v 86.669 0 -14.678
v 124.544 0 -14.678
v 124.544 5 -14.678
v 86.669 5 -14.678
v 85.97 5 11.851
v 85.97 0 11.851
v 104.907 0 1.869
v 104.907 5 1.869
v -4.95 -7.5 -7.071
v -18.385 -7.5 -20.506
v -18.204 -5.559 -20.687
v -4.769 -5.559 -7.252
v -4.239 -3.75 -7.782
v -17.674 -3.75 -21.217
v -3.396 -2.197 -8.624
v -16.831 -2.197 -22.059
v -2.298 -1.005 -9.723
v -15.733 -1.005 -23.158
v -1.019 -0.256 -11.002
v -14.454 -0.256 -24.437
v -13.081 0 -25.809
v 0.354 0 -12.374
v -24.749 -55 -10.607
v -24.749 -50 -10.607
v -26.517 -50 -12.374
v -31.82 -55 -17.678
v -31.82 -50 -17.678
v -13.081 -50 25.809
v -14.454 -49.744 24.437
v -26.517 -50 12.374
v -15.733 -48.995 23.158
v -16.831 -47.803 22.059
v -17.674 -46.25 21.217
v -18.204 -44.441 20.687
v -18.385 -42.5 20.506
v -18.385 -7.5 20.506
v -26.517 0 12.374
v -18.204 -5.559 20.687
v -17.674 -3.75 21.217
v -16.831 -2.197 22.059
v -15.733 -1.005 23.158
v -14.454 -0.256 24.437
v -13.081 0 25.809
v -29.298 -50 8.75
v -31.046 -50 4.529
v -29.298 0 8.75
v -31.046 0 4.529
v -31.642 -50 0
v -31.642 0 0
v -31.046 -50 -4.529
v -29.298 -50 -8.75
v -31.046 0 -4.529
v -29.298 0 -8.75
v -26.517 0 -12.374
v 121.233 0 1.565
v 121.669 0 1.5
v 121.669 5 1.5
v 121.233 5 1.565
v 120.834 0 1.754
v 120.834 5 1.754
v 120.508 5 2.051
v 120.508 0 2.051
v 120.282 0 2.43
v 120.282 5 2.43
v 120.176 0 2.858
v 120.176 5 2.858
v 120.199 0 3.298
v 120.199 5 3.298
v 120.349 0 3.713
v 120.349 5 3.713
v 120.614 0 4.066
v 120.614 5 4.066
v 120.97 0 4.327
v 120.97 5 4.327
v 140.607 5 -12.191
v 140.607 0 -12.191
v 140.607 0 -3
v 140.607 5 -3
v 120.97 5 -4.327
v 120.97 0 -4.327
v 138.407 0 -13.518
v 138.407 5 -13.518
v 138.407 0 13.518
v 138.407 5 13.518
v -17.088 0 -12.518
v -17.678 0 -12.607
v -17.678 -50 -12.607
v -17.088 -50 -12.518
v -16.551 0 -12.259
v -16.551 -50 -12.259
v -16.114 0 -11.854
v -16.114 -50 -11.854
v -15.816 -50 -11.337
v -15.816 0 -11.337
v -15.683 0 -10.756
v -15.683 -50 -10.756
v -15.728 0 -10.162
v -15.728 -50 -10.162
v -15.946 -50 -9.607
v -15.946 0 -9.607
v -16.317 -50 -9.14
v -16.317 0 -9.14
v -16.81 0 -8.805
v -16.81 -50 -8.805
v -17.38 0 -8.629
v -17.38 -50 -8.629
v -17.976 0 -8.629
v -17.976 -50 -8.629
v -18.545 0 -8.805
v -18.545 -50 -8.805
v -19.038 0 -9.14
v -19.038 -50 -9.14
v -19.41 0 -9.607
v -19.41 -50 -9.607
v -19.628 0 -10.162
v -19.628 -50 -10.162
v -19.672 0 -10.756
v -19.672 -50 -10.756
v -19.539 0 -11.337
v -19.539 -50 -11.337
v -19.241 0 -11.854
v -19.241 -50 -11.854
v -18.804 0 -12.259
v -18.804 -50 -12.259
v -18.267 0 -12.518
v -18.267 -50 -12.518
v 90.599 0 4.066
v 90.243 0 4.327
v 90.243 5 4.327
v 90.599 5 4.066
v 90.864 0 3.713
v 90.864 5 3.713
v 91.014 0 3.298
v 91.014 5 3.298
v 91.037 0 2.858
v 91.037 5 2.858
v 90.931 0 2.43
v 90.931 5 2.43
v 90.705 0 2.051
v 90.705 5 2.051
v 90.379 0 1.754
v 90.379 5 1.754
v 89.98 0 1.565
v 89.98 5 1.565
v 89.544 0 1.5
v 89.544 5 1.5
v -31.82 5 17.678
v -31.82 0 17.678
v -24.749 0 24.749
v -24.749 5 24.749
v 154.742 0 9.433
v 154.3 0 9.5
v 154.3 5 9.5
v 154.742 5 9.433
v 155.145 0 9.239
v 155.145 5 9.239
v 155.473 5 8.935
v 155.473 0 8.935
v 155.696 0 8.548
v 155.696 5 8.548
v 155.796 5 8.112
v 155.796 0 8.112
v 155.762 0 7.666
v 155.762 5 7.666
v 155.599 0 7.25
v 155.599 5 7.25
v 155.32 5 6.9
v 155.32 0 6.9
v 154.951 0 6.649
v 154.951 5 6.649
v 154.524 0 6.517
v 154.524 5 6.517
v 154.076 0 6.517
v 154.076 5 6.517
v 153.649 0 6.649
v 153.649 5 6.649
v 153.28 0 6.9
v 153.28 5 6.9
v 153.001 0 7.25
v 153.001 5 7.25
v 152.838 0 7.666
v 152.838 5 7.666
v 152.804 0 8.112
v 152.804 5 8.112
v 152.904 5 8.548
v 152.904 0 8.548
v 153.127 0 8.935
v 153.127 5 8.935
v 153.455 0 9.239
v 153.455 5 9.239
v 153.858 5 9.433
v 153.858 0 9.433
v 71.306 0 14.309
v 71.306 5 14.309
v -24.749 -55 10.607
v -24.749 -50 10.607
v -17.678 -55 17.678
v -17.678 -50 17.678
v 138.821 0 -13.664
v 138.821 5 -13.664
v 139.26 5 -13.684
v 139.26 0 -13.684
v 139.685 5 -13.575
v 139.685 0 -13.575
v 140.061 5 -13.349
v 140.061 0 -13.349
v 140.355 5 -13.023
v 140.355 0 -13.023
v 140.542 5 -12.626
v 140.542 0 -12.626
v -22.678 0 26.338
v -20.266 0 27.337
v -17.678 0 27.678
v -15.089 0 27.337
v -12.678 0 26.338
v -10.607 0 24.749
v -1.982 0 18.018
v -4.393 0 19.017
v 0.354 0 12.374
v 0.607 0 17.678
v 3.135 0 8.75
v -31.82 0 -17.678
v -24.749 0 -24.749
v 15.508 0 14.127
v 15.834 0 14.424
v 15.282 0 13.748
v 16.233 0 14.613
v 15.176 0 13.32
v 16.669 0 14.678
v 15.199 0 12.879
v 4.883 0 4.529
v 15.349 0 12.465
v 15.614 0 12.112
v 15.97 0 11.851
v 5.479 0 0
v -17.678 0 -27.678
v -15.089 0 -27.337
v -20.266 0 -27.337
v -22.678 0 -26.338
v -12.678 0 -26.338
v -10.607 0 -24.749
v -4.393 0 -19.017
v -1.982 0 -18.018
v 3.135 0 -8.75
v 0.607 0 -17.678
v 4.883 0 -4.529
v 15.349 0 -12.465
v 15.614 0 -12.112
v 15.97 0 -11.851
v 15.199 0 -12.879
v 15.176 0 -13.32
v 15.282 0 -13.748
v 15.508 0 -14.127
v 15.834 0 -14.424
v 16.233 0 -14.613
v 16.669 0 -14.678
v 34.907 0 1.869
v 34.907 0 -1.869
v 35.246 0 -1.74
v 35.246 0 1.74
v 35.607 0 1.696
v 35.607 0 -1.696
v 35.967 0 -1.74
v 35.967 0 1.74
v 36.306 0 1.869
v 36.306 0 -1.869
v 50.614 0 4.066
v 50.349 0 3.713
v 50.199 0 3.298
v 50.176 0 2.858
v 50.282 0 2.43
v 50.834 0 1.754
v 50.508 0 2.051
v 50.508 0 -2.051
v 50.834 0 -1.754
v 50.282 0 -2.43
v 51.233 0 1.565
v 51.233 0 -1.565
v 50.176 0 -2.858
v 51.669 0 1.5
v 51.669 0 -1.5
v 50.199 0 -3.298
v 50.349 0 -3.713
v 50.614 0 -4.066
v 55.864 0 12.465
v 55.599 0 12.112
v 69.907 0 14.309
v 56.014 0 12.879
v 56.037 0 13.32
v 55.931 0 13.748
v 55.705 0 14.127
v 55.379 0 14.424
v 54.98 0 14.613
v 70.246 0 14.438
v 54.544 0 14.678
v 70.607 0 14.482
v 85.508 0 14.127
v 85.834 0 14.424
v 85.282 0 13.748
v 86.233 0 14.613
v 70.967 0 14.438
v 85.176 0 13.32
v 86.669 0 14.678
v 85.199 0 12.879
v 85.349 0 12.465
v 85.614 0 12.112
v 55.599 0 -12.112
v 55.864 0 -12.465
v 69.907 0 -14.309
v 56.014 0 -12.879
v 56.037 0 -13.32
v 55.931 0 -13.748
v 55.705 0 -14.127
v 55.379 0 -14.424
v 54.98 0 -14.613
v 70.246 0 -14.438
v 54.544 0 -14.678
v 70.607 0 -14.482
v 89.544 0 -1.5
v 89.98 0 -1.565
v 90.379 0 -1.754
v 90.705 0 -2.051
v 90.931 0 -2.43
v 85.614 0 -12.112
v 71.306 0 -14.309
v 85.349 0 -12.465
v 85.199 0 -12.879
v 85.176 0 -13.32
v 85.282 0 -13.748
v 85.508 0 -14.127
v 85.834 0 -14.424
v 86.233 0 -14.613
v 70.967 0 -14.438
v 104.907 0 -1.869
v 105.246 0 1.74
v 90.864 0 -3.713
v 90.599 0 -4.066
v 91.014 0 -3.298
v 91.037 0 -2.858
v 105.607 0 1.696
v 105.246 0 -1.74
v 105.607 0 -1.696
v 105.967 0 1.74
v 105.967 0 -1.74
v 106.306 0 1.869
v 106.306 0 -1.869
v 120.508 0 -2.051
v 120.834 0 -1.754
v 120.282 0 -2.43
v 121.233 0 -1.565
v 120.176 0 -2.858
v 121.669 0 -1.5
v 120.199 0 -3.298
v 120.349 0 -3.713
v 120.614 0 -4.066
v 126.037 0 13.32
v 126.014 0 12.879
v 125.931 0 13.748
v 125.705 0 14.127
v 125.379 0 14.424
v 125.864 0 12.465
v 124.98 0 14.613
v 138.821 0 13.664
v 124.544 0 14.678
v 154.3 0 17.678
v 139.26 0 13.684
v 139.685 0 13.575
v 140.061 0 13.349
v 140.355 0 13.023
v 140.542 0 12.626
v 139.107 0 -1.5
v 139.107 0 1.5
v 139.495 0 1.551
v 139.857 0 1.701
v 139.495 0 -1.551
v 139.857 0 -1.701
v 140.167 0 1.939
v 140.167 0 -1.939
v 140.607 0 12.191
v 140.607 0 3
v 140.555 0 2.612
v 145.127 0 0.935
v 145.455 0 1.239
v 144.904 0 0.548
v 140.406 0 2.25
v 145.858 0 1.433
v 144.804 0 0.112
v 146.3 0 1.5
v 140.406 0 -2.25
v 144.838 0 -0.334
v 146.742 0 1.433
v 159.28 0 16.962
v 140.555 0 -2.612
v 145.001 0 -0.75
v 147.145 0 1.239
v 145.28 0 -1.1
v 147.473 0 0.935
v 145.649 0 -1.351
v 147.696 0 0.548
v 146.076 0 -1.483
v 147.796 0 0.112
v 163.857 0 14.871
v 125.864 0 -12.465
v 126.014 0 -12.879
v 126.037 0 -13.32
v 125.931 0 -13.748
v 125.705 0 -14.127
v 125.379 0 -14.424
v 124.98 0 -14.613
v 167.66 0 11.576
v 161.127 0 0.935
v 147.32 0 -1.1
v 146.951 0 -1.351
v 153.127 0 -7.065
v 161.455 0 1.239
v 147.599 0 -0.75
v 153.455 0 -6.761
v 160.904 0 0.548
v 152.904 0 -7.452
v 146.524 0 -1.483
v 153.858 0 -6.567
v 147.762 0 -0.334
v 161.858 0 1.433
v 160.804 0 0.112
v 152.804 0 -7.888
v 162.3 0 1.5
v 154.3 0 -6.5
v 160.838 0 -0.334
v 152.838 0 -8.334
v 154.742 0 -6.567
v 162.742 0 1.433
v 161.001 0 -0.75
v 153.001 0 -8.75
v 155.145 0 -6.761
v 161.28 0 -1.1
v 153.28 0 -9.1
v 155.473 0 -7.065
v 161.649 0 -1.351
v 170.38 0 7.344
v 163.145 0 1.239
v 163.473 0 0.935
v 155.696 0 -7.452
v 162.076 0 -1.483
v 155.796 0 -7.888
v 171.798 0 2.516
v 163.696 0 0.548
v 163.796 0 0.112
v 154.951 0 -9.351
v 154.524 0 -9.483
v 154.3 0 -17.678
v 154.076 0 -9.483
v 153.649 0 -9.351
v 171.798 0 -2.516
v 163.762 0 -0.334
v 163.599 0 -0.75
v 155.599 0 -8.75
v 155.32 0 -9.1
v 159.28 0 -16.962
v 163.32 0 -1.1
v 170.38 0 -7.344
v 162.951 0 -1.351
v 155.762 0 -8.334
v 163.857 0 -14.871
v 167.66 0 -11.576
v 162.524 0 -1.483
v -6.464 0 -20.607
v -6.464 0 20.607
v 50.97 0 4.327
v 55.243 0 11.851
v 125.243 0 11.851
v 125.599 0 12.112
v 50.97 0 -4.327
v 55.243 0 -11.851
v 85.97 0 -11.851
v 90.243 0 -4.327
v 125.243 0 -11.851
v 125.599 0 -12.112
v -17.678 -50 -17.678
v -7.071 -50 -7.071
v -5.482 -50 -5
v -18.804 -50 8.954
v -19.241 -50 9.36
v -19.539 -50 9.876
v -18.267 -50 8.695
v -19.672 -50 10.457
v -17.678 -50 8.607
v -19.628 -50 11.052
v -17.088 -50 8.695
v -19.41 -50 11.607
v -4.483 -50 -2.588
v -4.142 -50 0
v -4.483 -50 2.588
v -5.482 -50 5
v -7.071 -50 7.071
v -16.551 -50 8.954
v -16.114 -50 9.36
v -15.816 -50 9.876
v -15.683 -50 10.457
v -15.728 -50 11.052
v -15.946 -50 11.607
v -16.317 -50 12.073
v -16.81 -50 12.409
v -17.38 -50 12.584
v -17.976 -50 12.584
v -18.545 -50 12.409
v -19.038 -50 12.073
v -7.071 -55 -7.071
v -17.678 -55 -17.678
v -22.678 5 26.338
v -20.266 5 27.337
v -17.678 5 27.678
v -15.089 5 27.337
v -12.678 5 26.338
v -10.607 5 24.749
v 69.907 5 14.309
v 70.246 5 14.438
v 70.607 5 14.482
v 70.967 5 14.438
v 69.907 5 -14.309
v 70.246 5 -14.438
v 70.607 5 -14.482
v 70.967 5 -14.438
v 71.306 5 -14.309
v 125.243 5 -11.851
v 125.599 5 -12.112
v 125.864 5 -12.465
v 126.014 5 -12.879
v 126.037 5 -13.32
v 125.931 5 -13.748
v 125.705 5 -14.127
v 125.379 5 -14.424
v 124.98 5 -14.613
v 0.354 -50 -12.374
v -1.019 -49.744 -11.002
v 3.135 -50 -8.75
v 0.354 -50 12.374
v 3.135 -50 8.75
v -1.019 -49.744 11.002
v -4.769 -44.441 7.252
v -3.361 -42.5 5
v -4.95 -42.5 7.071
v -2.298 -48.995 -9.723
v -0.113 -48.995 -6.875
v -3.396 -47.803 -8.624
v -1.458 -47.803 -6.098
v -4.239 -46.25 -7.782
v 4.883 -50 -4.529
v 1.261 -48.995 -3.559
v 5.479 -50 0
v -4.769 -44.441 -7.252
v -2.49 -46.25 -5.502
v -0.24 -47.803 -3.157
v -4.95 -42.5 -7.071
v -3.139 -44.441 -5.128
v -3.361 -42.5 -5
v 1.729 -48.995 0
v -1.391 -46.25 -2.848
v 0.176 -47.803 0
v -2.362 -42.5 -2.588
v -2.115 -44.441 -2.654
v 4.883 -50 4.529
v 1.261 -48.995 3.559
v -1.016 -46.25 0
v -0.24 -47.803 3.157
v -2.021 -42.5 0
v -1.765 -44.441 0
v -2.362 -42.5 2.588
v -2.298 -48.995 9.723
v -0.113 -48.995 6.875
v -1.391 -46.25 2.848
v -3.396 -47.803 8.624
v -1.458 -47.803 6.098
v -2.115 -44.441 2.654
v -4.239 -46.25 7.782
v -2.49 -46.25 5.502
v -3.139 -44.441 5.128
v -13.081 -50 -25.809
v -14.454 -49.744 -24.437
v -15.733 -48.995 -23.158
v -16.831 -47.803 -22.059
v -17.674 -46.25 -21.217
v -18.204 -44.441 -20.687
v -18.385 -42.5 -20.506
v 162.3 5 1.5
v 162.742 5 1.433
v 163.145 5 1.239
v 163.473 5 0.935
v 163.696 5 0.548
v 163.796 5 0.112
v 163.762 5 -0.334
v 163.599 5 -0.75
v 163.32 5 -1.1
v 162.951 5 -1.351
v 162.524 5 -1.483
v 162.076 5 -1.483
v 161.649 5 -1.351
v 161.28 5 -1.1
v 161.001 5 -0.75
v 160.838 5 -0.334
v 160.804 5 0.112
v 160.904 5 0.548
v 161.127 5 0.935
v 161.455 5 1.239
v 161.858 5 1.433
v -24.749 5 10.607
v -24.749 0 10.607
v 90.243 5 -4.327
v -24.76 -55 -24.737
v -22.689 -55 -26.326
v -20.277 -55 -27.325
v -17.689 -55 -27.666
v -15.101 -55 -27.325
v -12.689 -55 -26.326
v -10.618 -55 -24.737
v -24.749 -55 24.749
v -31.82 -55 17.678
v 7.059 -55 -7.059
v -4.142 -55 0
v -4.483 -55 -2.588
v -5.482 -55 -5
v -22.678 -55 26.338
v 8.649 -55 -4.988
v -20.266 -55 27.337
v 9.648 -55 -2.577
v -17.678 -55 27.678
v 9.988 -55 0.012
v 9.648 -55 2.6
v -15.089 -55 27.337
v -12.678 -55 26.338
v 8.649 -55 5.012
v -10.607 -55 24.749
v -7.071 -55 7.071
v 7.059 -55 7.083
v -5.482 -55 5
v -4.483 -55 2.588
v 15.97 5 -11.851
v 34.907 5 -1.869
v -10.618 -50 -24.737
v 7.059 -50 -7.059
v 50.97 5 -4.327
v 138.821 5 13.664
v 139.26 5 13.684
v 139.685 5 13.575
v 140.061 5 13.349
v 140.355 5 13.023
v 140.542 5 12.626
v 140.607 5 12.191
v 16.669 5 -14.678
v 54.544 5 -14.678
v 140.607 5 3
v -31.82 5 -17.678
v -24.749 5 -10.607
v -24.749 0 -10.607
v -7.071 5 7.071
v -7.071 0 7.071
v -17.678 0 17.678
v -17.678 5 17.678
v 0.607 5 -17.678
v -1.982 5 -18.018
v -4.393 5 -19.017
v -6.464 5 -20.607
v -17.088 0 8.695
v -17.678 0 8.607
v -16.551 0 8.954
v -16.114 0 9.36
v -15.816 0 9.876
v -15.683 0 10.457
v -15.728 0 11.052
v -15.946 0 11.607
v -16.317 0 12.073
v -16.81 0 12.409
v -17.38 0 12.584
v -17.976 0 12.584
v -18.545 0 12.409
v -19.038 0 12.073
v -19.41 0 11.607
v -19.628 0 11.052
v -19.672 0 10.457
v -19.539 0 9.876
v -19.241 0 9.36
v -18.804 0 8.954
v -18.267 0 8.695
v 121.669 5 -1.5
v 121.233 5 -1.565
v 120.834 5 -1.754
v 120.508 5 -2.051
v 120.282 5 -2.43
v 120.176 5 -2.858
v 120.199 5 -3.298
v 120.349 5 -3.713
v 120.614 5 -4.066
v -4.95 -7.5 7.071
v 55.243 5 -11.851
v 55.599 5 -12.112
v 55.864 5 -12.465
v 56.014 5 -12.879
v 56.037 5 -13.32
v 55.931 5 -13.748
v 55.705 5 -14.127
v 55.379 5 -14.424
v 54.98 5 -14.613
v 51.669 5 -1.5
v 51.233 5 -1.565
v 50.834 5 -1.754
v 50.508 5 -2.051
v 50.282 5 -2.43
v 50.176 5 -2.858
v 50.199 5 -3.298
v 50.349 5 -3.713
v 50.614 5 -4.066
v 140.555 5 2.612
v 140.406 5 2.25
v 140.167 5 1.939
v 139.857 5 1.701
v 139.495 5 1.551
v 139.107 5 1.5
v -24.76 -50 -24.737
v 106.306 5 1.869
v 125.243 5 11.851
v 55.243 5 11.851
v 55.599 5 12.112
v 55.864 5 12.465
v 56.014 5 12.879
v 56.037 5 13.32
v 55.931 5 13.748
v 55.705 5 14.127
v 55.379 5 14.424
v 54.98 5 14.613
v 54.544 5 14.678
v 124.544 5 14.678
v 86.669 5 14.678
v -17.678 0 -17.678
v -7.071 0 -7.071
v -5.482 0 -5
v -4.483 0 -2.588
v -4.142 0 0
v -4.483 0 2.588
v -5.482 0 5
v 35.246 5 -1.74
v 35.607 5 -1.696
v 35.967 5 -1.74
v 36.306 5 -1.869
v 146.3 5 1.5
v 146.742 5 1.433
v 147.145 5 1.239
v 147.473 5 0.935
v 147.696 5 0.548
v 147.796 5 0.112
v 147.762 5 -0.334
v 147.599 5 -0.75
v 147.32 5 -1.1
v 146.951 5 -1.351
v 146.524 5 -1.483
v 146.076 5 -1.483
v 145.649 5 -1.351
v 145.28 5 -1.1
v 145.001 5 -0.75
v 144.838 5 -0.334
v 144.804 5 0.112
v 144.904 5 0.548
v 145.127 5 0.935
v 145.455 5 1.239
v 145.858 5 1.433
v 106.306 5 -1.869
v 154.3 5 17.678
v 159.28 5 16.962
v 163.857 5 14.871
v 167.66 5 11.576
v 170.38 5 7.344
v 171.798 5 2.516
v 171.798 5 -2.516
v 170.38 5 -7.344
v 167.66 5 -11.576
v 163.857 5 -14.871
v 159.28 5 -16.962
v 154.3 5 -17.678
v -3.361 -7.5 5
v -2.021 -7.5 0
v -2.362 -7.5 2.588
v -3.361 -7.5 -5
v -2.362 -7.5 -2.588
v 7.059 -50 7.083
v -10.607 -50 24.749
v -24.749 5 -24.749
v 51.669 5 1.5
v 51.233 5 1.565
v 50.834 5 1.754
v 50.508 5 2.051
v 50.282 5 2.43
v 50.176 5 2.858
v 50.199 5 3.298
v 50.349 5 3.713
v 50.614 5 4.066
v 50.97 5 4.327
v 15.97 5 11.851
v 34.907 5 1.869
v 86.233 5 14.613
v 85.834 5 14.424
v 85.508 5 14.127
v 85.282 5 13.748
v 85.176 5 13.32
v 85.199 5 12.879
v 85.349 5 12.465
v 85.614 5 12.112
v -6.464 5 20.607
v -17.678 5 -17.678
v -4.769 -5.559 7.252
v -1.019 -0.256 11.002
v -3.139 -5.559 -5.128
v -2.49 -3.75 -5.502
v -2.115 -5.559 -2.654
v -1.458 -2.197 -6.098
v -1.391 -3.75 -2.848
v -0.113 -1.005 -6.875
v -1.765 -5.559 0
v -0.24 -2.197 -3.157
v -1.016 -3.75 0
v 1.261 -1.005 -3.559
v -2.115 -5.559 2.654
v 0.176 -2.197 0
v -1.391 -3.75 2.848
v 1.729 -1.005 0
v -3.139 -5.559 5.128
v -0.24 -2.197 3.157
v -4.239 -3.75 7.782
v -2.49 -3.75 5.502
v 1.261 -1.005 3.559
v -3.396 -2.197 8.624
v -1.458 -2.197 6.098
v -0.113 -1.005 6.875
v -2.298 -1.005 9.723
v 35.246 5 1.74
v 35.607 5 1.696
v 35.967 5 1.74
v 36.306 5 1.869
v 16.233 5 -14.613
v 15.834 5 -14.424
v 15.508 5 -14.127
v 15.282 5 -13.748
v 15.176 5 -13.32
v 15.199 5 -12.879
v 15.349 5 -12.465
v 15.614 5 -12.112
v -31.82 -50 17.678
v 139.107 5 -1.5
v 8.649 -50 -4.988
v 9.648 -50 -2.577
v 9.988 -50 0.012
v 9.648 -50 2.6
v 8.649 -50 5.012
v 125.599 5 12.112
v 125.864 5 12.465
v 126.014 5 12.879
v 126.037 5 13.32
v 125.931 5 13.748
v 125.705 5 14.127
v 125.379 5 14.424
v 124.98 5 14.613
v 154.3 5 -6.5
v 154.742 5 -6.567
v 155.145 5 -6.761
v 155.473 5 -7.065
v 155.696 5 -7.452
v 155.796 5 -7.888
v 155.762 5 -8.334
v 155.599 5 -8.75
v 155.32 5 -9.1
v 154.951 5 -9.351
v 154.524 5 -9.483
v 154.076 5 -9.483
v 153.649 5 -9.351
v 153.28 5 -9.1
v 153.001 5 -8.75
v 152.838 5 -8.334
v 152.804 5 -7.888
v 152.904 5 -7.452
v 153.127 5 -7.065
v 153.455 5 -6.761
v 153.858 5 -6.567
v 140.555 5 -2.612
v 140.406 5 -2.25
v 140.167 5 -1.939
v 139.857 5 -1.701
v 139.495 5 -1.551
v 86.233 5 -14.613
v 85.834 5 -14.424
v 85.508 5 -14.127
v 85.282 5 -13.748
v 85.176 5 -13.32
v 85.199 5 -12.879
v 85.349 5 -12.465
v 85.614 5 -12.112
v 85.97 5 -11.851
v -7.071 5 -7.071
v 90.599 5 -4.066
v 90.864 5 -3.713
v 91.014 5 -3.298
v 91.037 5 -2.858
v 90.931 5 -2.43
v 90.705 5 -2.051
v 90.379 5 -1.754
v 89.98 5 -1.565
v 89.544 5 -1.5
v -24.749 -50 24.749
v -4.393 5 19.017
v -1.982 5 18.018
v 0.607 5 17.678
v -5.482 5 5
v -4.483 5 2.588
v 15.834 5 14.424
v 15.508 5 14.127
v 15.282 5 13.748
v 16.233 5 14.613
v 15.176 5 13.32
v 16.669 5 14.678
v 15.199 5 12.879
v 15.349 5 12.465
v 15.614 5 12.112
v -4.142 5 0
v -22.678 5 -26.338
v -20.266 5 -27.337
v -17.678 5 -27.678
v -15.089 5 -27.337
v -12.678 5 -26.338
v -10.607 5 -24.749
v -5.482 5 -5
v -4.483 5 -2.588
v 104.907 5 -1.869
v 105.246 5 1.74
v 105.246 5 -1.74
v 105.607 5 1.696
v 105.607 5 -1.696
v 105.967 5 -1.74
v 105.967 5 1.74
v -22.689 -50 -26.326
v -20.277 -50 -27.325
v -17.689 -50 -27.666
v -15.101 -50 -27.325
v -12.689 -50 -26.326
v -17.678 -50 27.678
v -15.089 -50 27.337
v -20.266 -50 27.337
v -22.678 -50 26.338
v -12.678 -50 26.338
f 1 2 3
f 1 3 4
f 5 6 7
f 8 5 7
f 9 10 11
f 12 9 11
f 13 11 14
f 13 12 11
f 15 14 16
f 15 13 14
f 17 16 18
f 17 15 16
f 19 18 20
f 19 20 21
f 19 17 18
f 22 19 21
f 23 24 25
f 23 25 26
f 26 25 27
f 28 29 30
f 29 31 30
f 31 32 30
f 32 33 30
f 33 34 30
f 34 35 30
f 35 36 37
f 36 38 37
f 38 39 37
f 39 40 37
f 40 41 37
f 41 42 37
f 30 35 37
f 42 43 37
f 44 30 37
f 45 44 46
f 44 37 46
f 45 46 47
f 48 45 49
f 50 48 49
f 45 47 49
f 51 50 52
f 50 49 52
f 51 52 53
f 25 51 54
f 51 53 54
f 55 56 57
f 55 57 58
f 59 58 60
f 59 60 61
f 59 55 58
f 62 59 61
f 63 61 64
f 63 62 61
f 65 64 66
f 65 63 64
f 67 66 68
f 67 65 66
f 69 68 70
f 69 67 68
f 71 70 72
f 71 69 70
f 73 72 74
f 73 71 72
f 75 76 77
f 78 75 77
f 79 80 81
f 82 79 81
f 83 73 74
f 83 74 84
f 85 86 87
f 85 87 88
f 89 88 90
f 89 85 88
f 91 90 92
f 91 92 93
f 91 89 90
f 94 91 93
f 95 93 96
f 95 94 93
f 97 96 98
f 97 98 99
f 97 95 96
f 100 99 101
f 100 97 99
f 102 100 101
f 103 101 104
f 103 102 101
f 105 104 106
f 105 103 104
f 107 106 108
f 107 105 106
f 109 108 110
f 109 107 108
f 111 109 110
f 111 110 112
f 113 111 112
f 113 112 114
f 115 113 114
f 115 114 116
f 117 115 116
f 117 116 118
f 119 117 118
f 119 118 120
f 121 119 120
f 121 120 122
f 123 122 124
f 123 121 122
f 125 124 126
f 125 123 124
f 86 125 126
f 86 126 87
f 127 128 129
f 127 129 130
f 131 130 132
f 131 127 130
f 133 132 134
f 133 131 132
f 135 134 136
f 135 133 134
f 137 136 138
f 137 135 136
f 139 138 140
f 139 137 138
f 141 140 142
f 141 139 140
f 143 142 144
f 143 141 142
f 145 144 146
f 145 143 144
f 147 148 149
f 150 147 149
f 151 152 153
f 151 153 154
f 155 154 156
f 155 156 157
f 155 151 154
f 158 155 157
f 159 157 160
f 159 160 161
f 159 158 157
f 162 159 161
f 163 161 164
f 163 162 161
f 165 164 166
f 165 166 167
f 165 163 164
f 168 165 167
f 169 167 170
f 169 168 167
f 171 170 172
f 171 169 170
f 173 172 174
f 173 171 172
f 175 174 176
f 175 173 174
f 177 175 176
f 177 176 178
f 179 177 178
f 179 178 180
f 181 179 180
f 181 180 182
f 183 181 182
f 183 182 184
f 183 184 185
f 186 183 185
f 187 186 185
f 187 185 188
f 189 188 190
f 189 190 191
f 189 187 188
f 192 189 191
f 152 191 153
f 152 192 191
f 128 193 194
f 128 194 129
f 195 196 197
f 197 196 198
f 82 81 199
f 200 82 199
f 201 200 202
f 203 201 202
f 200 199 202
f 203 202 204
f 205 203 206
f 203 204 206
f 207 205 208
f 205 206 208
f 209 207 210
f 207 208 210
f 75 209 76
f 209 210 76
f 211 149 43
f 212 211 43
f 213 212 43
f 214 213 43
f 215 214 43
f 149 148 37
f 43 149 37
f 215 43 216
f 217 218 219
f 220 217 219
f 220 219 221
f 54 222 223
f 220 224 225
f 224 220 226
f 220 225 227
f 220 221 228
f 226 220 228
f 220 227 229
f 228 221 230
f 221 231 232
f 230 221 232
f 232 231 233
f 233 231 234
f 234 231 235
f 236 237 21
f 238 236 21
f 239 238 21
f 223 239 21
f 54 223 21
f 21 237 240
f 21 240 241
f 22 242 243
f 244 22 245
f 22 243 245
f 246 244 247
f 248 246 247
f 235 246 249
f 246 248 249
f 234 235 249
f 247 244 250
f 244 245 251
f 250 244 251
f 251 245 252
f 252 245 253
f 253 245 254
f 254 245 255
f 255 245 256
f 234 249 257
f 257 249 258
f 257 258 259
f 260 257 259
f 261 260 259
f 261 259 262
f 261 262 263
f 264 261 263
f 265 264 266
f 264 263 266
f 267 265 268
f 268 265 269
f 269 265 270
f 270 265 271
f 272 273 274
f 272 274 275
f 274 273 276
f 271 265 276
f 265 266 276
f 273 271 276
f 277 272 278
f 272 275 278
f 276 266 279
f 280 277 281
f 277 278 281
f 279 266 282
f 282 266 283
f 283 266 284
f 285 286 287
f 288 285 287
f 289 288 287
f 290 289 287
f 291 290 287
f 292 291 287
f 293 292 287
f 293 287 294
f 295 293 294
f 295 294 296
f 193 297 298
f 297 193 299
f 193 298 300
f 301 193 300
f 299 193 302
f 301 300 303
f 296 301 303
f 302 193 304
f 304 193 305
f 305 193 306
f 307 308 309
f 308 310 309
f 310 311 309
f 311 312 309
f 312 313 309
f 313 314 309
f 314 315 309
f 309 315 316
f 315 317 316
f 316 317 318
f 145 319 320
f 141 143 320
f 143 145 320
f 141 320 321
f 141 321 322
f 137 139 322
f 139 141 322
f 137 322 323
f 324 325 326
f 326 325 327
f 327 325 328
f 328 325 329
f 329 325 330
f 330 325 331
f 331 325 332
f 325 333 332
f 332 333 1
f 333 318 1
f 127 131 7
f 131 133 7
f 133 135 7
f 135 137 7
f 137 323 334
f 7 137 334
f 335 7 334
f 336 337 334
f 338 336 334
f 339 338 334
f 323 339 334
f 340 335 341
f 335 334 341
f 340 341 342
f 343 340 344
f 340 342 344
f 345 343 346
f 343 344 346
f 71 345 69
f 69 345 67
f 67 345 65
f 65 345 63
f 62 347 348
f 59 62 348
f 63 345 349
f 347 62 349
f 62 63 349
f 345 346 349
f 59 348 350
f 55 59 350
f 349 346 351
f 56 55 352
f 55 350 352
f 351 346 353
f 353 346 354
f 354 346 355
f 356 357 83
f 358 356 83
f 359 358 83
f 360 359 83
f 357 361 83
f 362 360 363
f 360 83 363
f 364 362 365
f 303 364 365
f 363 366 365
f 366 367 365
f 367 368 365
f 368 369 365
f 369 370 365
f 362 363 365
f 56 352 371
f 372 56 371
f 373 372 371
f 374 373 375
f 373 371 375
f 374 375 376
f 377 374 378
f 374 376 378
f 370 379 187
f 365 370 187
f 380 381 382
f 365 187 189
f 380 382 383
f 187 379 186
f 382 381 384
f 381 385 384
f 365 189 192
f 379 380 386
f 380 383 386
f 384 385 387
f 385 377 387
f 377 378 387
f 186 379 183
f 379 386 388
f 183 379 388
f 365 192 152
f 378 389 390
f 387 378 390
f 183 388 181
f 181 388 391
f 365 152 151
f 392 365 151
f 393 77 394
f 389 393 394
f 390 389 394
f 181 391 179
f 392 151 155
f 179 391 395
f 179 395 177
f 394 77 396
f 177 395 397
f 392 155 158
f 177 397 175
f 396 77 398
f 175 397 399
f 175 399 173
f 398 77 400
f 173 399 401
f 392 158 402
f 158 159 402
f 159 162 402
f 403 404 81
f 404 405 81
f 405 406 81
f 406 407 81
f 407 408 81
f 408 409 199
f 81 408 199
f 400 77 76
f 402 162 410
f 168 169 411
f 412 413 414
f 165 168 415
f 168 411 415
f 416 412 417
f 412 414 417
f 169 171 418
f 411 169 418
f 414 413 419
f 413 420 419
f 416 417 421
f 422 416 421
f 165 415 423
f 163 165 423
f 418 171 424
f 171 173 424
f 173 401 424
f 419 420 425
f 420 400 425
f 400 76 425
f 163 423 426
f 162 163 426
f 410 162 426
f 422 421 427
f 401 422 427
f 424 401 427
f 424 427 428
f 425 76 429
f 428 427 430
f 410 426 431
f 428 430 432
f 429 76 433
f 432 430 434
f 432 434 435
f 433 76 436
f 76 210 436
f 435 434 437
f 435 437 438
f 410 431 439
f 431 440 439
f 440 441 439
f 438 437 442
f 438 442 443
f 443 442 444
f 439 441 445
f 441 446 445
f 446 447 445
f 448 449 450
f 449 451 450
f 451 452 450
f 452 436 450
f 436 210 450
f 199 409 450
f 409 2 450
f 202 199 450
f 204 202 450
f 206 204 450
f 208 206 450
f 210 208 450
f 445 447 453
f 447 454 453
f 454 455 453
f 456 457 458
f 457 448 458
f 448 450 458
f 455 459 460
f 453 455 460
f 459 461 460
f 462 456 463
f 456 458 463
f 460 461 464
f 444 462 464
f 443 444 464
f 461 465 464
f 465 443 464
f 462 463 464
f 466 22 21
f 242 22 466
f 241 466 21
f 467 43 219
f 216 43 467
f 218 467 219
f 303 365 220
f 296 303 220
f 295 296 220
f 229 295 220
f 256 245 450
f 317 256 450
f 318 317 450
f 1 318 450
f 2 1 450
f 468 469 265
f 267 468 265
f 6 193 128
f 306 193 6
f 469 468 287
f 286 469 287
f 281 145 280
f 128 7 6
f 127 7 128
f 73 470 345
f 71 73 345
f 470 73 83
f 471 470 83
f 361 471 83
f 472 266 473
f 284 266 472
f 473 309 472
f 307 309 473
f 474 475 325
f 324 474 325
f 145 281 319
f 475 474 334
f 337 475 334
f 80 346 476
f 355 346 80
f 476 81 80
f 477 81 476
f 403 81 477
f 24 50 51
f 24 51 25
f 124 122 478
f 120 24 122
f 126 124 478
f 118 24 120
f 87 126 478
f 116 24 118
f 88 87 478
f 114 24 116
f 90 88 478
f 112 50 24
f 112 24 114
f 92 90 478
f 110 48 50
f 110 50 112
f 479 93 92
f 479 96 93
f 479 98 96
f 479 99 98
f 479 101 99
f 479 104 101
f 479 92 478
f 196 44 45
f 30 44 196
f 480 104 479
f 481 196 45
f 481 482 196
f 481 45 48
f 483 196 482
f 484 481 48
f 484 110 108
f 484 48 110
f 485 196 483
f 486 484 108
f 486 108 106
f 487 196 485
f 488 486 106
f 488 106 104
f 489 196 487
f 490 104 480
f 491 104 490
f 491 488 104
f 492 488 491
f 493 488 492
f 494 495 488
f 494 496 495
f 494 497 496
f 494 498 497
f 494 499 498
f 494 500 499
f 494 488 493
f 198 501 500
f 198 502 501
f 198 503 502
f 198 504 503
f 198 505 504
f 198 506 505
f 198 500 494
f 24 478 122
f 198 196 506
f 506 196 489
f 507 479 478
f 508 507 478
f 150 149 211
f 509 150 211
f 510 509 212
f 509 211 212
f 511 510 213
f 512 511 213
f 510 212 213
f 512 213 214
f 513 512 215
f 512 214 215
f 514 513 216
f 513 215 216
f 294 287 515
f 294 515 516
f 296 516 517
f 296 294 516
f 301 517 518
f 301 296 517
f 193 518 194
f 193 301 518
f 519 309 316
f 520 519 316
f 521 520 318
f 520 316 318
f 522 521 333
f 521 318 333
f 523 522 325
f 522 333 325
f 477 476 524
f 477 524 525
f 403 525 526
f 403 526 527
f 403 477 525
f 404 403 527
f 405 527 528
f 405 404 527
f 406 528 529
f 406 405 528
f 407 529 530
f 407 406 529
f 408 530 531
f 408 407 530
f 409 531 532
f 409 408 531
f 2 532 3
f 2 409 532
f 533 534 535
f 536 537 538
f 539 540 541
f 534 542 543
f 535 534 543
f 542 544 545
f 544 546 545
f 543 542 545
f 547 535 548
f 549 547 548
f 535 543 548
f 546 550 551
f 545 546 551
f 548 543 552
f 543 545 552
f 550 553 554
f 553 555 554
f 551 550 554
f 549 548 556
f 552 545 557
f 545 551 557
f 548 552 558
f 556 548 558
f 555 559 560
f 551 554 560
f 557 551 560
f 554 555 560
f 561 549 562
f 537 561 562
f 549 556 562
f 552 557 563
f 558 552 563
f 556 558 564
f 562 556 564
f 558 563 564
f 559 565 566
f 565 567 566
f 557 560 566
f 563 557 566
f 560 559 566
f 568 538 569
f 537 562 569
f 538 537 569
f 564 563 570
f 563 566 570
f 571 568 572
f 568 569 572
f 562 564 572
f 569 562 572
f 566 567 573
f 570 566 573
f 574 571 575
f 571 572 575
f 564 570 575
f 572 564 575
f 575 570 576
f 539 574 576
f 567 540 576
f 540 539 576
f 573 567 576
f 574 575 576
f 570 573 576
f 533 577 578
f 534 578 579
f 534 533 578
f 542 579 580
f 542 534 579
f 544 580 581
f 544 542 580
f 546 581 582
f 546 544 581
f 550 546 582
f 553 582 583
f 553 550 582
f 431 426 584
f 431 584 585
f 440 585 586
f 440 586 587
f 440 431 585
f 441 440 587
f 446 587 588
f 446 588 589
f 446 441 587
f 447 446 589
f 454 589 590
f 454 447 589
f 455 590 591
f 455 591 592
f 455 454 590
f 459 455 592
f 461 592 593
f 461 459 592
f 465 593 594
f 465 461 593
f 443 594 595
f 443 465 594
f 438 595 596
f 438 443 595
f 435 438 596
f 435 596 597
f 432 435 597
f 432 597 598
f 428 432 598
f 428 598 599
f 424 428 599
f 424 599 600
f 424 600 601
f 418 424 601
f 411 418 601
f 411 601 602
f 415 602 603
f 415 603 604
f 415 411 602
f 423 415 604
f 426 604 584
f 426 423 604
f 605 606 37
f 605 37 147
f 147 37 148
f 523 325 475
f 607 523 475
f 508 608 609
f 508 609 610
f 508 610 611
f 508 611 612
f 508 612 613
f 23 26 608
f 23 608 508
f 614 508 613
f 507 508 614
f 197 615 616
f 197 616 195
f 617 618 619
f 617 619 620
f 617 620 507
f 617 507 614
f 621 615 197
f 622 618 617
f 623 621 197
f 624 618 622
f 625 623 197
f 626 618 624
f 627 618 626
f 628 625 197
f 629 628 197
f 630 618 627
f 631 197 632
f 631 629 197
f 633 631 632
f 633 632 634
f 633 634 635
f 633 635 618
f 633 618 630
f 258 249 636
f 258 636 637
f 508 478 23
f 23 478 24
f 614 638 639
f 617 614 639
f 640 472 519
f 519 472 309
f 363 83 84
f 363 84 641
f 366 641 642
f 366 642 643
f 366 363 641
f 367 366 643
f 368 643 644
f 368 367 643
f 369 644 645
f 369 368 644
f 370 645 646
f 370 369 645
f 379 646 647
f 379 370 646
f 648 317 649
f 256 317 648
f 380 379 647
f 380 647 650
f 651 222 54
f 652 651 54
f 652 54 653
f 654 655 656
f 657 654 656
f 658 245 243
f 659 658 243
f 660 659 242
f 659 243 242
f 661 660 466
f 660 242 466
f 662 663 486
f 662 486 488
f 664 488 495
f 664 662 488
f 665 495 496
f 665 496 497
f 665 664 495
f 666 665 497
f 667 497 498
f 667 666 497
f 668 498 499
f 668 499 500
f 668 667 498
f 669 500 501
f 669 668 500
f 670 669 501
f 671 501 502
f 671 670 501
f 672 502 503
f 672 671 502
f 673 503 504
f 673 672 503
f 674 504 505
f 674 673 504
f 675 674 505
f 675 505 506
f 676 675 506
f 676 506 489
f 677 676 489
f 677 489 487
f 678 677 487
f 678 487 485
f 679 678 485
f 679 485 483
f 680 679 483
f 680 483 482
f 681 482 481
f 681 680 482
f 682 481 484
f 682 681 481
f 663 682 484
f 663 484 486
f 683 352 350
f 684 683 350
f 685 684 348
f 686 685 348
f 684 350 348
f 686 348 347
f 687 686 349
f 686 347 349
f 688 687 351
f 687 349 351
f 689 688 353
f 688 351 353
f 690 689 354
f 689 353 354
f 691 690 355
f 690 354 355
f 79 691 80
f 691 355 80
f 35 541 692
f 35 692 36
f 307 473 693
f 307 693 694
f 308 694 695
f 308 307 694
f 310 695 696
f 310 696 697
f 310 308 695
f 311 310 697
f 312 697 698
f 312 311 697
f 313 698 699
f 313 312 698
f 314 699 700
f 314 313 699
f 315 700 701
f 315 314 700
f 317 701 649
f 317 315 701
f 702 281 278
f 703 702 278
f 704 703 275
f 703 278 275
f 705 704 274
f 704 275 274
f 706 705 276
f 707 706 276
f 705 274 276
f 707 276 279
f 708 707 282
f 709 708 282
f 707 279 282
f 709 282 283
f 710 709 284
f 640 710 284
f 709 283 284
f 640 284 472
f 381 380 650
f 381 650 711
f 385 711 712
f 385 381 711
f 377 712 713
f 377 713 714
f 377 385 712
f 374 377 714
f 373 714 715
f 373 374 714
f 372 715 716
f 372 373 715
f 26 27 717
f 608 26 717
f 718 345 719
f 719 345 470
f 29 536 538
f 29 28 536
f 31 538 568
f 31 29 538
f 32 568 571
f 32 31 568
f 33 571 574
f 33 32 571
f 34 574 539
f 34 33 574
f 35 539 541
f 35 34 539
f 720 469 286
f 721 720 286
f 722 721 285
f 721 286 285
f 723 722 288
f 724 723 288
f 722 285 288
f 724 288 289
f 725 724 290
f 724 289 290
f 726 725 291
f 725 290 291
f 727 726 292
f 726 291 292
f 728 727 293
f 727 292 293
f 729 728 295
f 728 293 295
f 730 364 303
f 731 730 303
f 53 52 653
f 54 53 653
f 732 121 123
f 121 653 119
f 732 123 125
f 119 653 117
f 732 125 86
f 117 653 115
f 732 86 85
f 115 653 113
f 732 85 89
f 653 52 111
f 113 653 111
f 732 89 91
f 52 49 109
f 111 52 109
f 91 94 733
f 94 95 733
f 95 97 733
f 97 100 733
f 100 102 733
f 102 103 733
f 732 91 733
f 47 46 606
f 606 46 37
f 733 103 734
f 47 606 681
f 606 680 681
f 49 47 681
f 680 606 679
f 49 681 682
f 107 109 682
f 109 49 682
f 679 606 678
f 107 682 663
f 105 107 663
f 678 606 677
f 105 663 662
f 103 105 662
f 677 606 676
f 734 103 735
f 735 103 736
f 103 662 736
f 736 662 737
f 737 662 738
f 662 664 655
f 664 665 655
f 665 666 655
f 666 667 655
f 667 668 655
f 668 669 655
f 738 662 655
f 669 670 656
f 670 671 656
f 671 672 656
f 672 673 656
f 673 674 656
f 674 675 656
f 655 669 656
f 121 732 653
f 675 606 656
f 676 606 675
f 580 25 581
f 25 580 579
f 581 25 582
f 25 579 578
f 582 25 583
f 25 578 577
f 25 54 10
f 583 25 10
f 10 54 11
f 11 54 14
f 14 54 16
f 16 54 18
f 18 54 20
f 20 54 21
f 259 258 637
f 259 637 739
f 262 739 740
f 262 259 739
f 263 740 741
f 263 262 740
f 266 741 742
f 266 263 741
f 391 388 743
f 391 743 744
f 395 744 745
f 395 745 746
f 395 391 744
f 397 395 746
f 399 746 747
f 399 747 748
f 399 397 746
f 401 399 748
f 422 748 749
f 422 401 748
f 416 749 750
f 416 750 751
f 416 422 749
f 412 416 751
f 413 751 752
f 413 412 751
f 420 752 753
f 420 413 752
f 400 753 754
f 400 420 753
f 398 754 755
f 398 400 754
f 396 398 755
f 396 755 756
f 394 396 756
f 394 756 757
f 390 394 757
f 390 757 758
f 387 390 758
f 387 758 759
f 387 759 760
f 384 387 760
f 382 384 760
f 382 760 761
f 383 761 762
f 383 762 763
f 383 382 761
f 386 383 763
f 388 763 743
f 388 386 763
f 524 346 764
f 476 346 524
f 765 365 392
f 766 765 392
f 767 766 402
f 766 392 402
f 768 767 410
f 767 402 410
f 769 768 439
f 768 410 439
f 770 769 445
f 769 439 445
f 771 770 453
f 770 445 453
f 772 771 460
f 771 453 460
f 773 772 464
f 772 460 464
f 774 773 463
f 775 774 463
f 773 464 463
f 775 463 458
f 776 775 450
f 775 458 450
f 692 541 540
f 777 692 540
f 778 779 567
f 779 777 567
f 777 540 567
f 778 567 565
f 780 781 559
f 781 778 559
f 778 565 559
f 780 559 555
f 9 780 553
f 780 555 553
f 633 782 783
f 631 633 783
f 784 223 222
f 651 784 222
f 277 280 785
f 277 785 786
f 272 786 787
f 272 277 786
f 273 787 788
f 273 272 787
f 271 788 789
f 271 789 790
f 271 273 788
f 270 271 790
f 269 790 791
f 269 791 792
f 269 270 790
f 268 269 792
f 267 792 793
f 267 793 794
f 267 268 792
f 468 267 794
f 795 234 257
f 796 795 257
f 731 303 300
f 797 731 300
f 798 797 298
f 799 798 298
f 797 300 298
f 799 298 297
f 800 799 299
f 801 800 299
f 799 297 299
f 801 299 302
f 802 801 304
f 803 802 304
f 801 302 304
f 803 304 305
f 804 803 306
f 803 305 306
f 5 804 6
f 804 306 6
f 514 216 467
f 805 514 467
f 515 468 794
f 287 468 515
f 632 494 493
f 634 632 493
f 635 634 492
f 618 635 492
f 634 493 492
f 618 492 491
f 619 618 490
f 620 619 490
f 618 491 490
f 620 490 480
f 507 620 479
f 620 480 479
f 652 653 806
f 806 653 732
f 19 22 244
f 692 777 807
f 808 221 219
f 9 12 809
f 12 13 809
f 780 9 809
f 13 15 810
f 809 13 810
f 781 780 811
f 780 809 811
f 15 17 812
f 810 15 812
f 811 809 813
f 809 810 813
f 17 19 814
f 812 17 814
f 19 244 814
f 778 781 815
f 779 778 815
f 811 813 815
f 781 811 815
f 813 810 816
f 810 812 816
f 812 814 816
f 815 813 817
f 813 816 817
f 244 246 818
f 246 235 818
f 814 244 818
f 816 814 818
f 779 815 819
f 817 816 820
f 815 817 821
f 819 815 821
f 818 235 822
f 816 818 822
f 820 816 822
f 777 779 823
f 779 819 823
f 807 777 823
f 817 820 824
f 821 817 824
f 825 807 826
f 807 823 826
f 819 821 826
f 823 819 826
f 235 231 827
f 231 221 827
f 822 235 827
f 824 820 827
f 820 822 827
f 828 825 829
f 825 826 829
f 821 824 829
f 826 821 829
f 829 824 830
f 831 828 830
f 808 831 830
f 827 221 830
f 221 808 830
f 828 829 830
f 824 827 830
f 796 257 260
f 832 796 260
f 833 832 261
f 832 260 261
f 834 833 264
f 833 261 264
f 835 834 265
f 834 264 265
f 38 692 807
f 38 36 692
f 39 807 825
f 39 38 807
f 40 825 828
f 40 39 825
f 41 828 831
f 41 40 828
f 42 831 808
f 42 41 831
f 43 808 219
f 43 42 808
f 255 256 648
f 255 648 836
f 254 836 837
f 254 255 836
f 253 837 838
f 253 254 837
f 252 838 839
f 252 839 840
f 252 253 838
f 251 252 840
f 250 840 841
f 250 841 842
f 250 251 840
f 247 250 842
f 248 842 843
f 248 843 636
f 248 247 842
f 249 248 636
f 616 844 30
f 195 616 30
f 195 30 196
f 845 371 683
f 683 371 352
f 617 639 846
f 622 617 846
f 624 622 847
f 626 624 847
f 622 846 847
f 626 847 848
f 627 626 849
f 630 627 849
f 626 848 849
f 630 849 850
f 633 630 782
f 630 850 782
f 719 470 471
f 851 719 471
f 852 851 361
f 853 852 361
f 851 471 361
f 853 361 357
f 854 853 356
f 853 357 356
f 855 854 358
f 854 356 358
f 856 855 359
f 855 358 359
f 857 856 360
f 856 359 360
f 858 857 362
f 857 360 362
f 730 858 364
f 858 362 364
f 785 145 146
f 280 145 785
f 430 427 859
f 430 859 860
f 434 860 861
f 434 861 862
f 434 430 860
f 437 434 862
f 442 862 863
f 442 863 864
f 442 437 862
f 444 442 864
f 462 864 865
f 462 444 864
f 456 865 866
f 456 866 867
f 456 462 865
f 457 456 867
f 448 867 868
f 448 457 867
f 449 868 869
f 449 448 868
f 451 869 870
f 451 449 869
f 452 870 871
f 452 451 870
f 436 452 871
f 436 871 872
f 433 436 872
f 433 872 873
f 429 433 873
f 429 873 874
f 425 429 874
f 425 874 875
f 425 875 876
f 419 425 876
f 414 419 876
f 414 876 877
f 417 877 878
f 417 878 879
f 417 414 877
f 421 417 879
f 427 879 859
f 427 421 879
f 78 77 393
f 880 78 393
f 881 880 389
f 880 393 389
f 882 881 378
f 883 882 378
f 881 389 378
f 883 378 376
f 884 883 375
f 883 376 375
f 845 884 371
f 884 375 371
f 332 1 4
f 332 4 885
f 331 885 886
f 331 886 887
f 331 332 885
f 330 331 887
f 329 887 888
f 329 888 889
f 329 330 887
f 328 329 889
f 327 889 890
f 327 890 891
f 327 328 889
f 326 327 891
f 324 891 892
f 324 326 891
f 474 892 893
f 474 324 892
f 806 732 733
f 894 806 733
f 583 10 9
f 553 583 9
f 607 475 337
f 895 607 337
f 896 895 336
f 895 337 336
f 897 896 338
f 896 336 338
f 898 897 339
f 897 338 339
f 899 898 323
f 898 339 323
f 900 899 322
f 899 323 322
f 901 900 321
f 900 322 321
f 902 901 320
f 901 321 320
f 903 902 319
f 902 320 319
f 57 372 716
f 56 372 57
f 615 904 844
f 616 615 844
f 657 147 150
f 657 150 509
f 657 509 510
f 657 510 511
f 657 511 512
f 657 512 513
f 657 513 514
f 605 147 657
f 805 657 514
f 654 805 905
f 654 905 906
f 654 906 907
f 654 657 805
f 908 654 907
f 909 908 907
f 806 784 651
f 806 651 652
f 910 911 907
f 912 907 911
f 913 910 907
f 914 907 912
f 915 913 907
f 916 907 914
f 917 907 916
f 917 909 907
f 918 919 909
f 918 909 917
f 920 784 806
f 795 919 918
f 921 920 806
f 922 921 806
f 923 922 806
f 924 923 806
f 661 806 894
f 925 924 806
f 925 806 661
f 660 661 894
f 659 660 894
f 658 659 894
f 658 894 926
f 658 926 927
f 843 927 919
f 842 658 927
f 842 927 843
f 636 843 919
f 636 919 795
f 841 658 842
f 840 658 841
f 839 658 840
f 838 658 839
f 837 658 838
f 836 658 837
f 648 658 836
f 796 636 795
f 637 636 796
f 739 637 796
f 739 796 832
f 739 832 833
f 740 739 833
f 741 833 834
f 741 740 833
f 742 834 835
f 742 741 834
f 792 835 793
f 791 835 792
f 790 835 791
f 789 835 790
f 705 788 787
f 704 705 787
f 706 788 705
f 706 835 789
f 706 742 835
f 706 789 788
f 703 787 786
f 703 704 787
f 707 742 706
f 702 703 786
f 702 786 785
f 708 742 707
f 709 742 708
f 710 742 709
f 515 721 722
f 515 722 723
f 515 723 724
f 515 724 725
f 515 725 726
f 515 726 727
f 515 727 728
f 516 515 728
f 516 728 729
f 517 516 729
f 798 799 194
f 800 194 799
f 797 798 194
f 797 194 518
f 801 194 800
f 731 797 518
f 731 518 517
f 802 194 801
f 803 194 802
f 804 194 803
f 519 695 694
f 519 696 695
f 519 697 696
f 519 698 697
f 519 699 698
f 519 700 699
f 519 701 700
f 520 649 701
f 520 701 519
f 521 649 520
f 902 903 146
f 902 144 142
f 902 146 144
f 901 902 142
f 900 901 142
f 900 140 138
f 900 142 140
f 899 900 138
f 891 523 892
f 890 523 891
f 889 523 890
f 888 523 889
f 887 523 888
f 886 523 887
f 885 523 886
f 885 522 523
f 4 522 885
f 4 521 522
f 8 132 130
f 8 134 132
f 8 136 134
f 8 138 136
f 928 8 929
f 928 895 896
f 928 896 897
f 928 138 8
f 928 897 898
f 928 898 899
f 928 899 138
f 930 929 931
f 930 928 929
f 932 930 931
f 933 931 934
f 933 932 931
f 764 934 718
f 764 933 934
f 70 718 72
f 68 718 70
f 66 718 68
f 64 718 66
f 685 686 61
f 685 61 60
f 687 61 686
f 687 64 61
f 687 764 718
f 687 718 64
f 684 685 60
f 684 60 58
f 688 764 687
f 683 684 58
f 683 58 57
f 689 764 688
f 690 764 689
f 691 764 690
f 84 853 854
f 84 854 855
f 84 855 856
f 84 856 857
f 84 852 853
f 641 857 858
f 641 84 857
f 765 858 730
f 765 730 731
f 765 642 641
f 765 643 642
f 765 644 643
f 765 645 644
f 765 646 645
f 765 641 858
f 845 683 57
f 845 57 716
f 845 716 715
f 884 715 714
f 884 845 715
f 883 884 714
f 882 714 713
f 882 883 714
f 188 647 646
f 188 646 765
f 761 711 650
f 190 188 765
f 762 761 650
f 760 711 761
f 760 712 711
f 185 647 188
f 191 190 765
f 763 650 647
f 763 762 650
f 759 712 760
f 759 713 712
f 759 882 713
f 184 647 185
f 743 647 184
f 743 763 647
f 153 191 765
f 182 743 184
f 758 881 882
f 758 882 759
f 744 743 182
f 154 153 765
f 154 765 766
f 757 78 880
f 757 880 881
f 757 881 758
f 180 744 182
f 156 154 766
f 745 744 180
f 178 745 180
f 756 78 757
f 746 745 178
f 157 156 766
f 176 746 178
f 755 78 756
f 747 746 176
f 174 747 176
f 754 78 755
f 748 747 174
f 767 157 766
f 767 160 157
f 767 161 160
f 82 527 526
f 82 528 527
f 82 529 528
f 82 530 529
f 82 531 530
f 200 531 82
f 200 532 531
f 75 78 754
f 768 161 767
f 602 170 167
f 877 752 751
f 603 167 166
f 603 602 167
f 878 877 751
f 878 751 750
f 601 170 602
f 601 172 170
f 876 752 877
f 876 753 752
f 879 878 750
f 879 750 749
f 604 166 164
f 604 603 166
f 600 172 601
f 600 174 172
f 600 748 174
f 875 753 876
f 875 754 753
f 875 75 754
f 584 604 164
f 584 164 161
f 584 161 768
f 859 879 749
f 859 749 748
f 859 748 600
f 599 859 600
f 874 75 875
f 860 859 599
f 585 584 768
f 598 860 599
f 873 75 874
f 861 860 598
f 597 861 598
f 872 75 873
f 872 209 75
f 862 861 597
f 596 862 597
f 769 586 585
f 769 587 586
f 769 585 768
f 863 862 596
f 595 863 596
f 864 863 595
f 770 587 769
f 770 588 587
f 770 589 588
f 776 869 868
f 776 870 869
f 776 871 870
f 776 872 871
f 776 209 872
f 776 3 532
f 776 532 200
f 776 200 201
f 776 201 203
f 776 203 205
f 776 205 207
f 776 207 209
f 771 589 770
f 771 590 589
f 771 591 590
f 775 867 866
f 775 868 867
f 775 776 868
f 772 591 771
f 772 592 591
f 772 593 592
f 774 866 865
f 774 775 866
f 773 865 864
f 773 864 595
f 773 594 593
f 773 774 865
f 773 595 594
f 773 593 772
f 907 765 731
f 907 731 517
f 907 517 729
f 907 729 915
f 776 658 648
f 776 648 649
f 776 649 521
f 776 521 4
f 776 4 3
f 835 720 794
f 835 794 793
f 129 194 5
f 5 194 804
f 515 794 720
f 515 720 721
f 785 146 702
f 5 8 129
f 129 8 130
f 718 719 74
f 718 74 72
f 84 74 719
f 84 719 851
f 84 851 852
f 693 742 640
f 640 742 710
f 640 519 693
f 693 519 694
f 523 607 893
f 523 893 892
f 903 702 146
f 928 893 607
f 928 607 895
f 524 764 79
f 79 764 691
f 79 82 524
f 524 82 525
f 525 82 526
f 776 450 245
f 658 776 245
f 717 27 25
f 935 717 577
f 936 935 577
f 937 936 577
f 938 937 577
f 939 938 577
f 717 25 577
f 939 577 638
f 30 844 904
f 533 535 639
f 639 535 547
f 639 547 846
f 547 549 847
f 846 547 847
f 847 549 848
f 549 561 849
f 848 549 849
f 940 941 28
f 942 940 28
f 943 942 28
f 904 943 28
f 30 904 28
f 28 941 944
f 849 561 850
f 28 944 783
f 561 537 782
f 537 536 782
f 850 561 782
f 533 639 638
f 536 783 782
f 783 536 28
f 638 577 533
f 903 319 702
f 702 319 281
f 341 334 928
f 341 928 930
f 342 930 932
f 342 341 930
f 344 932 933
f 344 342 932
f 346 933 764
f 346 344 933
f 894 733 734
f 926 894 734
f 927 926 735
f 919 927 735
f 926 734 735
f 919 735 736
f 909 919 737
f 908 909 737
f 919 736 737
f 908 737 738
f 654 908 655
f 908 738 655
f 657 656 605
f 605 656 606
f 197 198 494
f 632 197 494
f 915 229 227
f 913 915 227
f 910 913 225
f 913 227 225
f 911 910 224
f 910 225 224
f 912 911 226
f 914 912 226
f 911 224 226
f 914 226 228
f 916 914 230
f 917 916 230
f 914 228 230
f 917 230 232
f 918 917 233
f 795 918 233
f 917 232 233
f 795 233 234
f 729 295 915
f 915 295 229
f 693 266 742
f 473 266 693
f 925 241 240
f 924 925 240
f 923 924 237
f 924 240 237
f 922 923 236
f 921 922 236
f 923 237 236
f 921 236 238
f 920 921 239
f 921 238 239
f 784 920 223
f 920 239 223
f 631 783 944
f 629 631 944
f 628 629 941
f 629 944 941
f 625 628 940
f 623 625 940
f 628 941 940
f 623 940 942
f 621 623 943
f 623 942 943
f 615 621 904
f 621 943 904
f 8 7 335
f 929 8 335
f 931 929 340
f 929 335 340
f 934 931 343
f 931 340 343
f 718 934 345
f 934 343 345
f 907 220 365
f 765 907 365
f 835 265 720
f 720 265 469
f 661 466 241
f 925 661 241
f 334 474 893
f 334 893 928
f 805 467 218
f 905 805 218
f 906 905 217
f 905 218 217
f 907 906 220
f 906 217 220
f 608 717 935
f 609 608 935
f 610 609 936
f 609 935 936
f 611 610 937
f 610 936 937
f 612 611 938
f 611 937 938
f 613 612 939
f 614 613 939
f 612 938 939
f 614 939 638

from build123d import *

# Parameters (mm, degrees)
SKETCH1_R            = 1.5
BOSS_EXTRUDE1_DEPTH  = 5
SKETCH2_R            = 2
BOSS_EXTRUDE13_DEPTH = 50
FILLET3_R            = 10
FILLET8_R            = 7.5
BOSS_EXTRUDE14_DEPTH = 5
FILLET9_R            = 7.5


with BuildPart() as part:
    # Sketch1 → Boss-Extrude1 (new body)
    with BuildSketch(Plane(origin=(0, 0, 0), x_dir=(1, 0, 0), z_dir=(0, 1, 0))):
        with BuildLine():
            Line((-7.071067812, -7.071067812), (-17.67766953, -17.67766953))
            Line((-17.67766953, -17.67766953), (-24.748737342, -10.606601718))
            Line((-24.748737342, -10.606601718), (-31.819805153, -17.67766953))
            Line((-31.819805153, -17.67766953), (-24.748737342, -24.748737342))
            ThreePointArc((-24.748737342, -24.748737342), (-17.67766953, -27.67766953), (-10.606601718, -24.748737342))
            Line((-10.606601718, -24.748737342), (-6.464466135, -20.606601758))
            ThreePointArc((-6.464466135, -20.606601758), (-3.220232647, -18.438874245), (0.606601677, -17.67766957))
            Line((0.606601677, -17.67766957), (154.3, -17.67766957))
            ThreePointArc((154.3, -17.67766957), (171.97766953, 0), (154.3, 17.67766953))
            Line((154.3, 17.67766953), (0.606601718, 17.67766953))
            ThreePointArc((0.606601718, 17.67766953), (-3.220232606, 18.438874205), (-6.464466094, 20.606601718))
            Line((-6.464466094, 20.606601718), (-10.606601718, 24.748737342))
            ThreePointArc((-10.606601718, 24.748737342), (-17.67766953, 27.67766953), (-24.748737342, 24.748737342))
            Line((-24.748737342, 24.748737342), (-31.819805153, 17.67766953))
            Line((-31.819805153, 17.67766953), (-24.748737342, 10.606601718))
            Line((-24.748737342, 10.606601718), (-17.67766953, 17.67766953))
            Line((-17.67766953, 17.67766953), (-7.071067812, 7.071067812))
            ThreePointArc((-7.071067812, 7.071067812), (-4.142135624, 0), (-7.071067812, -7.071067812))
        make_face()
        with Locations(Location((146.3, 0, 0), (0, 0, 270))):
            Circle(SKETCH1_R, mode=Mode.SUBTRACT)
        with Locations(Location((154.3, -8, 0), (0, 0, 270))):
            Circle(SKETCH1_R, mode=Mode.SUBTRACT)
        with Locations(Location((162.3, 0, 0), (0, 0, 270))):
            Circle(SKETCH1_R, mode=Mode.SUBTRACT)
        with Locations(Location((154.3, 8, 0), (0, 0, 270))):
            Circle(SKETCH1_R, mode=Mode.SUBTRACT)
        with BuildLine():
            Line((15.969736075, 11.850725041), (34.90716028, 1.868680325))
            ThreePointArc((34.90716028, 1.868680325), (35.606601718, 1.695624813), (36.306043156, 1.868680325))
            Line((36.306043156, 1.868680325), (55.24346736, 11.850725041))
            ThreePointArc((55.24346736, 11.850725041), (56.000119452, 13.537935589), (54.544025922, 14.67766953))
            Line((54.544025922, 14.67766953), (16.669177513, 14.67766953))
            ThreePointArc((16.669177513, 14.67766953), (15.213083984, 13.537935589), (15.969736075, 11.850725041))
        make_face(mode=Mode.SUBTRACT)
        with BuildLine():
            Line((50.969736075, 4.326944488), (69.90716028, 14.308989205))
            ThreePointArc((69.90716028, 14.308989205), (70.606601718, 14.482044716), (71.306043156, 14.308989205))
            Line((71.306043156, 14.308989205), (90.24346736, 4.326944488))
            ThreePointArc((90.24346736, 4.326944488), (91.000119452, 2.63973394), (89.544025922, 1.5))
            Line((89.544025922, 1.5), (51.669177513, 1.5))
            ThreePointArc((51.669177513, 1.5), (50.213083984, 2.63973394), (50.969736075, 4.326944488))
        make_face(mode=Mode.SUBTRACT)
        with BuildLine():
            Line((85.969736075, 11.850725041), (104.90716028, 1.868680325))
            ThreePointArc((104.90716028, 1.868680325), (105.606601718, 1.695624813), (106.306043156, 1.868680325))
            Line((106.306043156, 1.868680325), (125.24346736, 11.850725041))
            ThreePointArc((125.24346736, 11.850725041), (126.000119452, 13.537935589), (124.544025922, 14.67766953))
            Line((124.544025922, 14.67766953), (86.669177513, 14.67766953))
            ThreePointArc((86.669177513, 14.67766953), (85.213083984, 13.537935589), (85.969736075, 11.850725041))
        make_face(mode=Mode.SUBTRACT)
        with BuildLine():
            Line((120.969736075, 4.326944488), (138.40716028, 13.518329033))
            ThreePointArc((138.40716028, 13.518329033), (139.881468753, 13.475744727), (140.606601718, 12.191384545))
            Line((140.606601718, 12.191384545), (140.606601718, 3))
            ThreePointArc((140.606601718, 3), (140.16726189, 1.939339828), (139.106601718, 1.5))
            Line((139.106601718, 1.5), (121.669177513, 1.5))
            ThreePointArc((121.669177513, 1.5), (120.213083984, 2.63973394), (120.969736075, 4.326944488))
        make_face(mode=Mode.SUBTRACT)
        with BuildLine():
            Line((140.606601718, -12.191384545), (140.606601718, -3))
            ThreePointArc((140.606601718, -3), (140.16726189, -1.939339828), (139.106601718, -1.5))
            Line((139.106601718, -1.5), (121.669177513, -1.5))
            ThreePointArc((121.669177513, -1.5), (120.213083984, -2.63973394), (120.969736075, -4.326944488))
            Line((120.969736075, -4.326944488), (138.40716028, -13.518329033))
            ThreePointArc((138.40716028, -13.518329033), (139.881468753, -13.475744727), (140.606601718, -12.191384545))
        make_face(mode=Mode.SUBTRACT)
        with BuildLine():
            Line((124.544025922, -14.67766953), (86.669177513, -14.67766953))
            ThreePointArc((86.669177513, -14.67766953), (85.213083984, -13.537935589), (85.969736075, -11.850725041))
            Line((85.969736075, -11.850725041), (104.90716028, -1.868680325))
            ThreePointArc((104.90716028, -1.868680325), (105.606601718, -1.695624813), (106.306043156, -1.868680325))
            Line((106.306043156, -1.868680325), (125.24346736, -11.850725041))
            ThreePointArc((125.24346736, -11.850725041), (126.000119452, -13.537935589), (124.544025922, -14.67766953))
        make_face(mode=Mode.SUBTRACT)
        with BuildLine():
            Line((71.306043156, -14.308989205), (90.24346736, -4.326944488))
            ThreePointArc((90.24346736, -4.326944488), (91.000119452, -2.63973394), (89.544025922, -1.5))
            Line((89.544025922, -1.5), (51.669177513, -1.5))
            ThreePointArc((51.669177513, -1.5), (50.213083984, -2.63973394), (50.969736075, -4.326944488))
            Line((50.969736075, -4.326944488), (69.90716028, -14.308989205))
            ThreePointArc((69.90716028, -14.308989205), (70.606601718, -14.482044716), (71.306043156, -14.308989205))
        make_face(mode=Mode.SUBTRACT)
        with BuildLine():
            Line((36.306043156, -1.868680325), (55.24346736, -11.850725041))
            ThreePointArc((55.24346736, -11.850725041), (56.000119452, -13.537935589), (54.544025922, -14.67766953))
            Line((54.544025922, -14.67766953), (16.669177513, -14.67766953))
            ThreePointArc((16.669177513, -14.67766953), (15.213083984, -13.537935589), (15.969736075, -11.850725041))
            Line((15.969736075, -11.850725041), (34.90716028, -1.868680325))
            ThreePointArc((34.90716028, -1.868680325), (35.606601718, -1.695624813), (36.306043156, -1.868680325))
        make_face(mode=Mode.SUBTRACT)
    extrude(amount=BOSS_EXTRUDE1_DEPTH)

    # Sketch2 → Boss-Extrude13 (add)
    with BuildSketch(Plane.XZ):
        with BuildLine():
            Line((2.121320344, 0), (-18.384776311, 20.506096654))
            Line((-18.384776311, 20.506096654), (-26.516504294, 12.374368671))
            ThreePointArc((-26.516504294, 12.374368671), (-31.642135624, 0), (-26.516504294, -12.374368671))
            Line((-26.516504294, -12.374368671), (-18.384776311, -20.506096654))
            Line((-18.384776311, -20.506096654), (2.121320344, 0))
        make_face()
        Polygon((-24.748737342, -10.606601718), (-24.748737342, 10.606601718), (-21.213203436, 14.142135624), (-17.67766953, 17.67766953), (0, 0), (-17.67766953, -17.67766953), (-21.213203436, -14.142135624), align=None, mode=Mode.SUBTRACT)
        Polygon((-21.213203436, 14.142135624), (-24.748737342, 10.606601718), (-24.748737342, -10.606601718), (-21.213203436, -14.142135624), (-17.67766953, -17.67766953), (0, 0), (-17.67766953, 17.67766953), align=None)
        with Locations(Location((-17.67766953, -10.606601718, 0), (0, 0, 270))):
            Circle(SKETCH2_R, mode=Mode.SUBTRACT)
        with Locations(Location((-17.67766953, 10.606601718, 0), (0, 0, 270))):
            Circle(SKETCH2_R, mode=Mode.SUBTRACT)
    extrude(amount=BOSS_EXTRUDE13_DEPTH)

    # Fillet3
    fillet3_edges = [part.edges().sort_by_distance(p)[0] for p in [
        (2.121320344, -25, 0),
    ]]
    fillet(fillet3_edges, radius=FILLET3_R)

    # Fillet8
    fillet8_edges = [part.edges().sort_by_distance(p)[0] for p in [
        (-11.66726189, 0, 13.788582233),
        (-11.66726189, 0, -13.788582233),
        (-2.02081528, 0, 0),
    ]]
    fillet(fillet8_edges, radius=FILLET8_R)

    # Sketch3 → Boss-Extrude14 (add)
    with BuildSketch(Plane.XZ.offset(50)):
        with BuildLine():
            Line((-7.071067812, -7.071067812), (-17.67766953, -17.67766953))
            Line((-17.67766953, -17.67766953), (-24.748737342, -10.606601718))
            Line((-24.748737342, -10.606601718), (-31.819805153, -17.67766953))
            Line((-31.819805153, -17.67766953), (-24.760321052, -24.737153631))
            ThreePointArc((-24.760321052, -24.737153631), (-17.68925324, -27.666085819), (-10.618185428, -24.737153631))
            Line((-10.618185428, -24.737153631), (7.059484102, -7.059484102))
            ThreePointArc((7.059484102, -7.059484102), (9.98841629, 0.01158371), (7.059484102, 7.082651522))
            Line((7.059484102, 7.082651522), (-10.606601718, 24.748737342))
            ThreePointArc((-10.606601718, 24.748737342), (-17.67766953, 27.67766953), (-24.748737342, 24.748737342))
            Line((-24.748737342, 24.748737342), (-31.819805153, 17.67766953))
            Line((-31.819805153, 17.67766953), (-24.748737342, 10.606601718))
            Line((-24.748737342, 10.606601718), (-17.67766953, 17.67766953))
            Line((-17.67766953, 17.67766953), (-7.071067812, 7.071067812))
            ThreePointArc((-7.071067812, 7.071067812), (-4.142135624, 0), (-7.071067812, -7.071067812))
        make_face()
    extrude(amount=BOSS_EXTRUDE14_DEPTH)

    # Fillet9
    fillet9_edges = [part.edges().sort_by_distance(p)[0] for p in [
        (-11.66726189, -50, 13.788582233),
        (-11.66726189, -50, -13.788582233),
        (-2.02081528, -50, 0),
    ]]
    fillet(fillet9_edges, radius=FILLET9_R)


solid = part.part
